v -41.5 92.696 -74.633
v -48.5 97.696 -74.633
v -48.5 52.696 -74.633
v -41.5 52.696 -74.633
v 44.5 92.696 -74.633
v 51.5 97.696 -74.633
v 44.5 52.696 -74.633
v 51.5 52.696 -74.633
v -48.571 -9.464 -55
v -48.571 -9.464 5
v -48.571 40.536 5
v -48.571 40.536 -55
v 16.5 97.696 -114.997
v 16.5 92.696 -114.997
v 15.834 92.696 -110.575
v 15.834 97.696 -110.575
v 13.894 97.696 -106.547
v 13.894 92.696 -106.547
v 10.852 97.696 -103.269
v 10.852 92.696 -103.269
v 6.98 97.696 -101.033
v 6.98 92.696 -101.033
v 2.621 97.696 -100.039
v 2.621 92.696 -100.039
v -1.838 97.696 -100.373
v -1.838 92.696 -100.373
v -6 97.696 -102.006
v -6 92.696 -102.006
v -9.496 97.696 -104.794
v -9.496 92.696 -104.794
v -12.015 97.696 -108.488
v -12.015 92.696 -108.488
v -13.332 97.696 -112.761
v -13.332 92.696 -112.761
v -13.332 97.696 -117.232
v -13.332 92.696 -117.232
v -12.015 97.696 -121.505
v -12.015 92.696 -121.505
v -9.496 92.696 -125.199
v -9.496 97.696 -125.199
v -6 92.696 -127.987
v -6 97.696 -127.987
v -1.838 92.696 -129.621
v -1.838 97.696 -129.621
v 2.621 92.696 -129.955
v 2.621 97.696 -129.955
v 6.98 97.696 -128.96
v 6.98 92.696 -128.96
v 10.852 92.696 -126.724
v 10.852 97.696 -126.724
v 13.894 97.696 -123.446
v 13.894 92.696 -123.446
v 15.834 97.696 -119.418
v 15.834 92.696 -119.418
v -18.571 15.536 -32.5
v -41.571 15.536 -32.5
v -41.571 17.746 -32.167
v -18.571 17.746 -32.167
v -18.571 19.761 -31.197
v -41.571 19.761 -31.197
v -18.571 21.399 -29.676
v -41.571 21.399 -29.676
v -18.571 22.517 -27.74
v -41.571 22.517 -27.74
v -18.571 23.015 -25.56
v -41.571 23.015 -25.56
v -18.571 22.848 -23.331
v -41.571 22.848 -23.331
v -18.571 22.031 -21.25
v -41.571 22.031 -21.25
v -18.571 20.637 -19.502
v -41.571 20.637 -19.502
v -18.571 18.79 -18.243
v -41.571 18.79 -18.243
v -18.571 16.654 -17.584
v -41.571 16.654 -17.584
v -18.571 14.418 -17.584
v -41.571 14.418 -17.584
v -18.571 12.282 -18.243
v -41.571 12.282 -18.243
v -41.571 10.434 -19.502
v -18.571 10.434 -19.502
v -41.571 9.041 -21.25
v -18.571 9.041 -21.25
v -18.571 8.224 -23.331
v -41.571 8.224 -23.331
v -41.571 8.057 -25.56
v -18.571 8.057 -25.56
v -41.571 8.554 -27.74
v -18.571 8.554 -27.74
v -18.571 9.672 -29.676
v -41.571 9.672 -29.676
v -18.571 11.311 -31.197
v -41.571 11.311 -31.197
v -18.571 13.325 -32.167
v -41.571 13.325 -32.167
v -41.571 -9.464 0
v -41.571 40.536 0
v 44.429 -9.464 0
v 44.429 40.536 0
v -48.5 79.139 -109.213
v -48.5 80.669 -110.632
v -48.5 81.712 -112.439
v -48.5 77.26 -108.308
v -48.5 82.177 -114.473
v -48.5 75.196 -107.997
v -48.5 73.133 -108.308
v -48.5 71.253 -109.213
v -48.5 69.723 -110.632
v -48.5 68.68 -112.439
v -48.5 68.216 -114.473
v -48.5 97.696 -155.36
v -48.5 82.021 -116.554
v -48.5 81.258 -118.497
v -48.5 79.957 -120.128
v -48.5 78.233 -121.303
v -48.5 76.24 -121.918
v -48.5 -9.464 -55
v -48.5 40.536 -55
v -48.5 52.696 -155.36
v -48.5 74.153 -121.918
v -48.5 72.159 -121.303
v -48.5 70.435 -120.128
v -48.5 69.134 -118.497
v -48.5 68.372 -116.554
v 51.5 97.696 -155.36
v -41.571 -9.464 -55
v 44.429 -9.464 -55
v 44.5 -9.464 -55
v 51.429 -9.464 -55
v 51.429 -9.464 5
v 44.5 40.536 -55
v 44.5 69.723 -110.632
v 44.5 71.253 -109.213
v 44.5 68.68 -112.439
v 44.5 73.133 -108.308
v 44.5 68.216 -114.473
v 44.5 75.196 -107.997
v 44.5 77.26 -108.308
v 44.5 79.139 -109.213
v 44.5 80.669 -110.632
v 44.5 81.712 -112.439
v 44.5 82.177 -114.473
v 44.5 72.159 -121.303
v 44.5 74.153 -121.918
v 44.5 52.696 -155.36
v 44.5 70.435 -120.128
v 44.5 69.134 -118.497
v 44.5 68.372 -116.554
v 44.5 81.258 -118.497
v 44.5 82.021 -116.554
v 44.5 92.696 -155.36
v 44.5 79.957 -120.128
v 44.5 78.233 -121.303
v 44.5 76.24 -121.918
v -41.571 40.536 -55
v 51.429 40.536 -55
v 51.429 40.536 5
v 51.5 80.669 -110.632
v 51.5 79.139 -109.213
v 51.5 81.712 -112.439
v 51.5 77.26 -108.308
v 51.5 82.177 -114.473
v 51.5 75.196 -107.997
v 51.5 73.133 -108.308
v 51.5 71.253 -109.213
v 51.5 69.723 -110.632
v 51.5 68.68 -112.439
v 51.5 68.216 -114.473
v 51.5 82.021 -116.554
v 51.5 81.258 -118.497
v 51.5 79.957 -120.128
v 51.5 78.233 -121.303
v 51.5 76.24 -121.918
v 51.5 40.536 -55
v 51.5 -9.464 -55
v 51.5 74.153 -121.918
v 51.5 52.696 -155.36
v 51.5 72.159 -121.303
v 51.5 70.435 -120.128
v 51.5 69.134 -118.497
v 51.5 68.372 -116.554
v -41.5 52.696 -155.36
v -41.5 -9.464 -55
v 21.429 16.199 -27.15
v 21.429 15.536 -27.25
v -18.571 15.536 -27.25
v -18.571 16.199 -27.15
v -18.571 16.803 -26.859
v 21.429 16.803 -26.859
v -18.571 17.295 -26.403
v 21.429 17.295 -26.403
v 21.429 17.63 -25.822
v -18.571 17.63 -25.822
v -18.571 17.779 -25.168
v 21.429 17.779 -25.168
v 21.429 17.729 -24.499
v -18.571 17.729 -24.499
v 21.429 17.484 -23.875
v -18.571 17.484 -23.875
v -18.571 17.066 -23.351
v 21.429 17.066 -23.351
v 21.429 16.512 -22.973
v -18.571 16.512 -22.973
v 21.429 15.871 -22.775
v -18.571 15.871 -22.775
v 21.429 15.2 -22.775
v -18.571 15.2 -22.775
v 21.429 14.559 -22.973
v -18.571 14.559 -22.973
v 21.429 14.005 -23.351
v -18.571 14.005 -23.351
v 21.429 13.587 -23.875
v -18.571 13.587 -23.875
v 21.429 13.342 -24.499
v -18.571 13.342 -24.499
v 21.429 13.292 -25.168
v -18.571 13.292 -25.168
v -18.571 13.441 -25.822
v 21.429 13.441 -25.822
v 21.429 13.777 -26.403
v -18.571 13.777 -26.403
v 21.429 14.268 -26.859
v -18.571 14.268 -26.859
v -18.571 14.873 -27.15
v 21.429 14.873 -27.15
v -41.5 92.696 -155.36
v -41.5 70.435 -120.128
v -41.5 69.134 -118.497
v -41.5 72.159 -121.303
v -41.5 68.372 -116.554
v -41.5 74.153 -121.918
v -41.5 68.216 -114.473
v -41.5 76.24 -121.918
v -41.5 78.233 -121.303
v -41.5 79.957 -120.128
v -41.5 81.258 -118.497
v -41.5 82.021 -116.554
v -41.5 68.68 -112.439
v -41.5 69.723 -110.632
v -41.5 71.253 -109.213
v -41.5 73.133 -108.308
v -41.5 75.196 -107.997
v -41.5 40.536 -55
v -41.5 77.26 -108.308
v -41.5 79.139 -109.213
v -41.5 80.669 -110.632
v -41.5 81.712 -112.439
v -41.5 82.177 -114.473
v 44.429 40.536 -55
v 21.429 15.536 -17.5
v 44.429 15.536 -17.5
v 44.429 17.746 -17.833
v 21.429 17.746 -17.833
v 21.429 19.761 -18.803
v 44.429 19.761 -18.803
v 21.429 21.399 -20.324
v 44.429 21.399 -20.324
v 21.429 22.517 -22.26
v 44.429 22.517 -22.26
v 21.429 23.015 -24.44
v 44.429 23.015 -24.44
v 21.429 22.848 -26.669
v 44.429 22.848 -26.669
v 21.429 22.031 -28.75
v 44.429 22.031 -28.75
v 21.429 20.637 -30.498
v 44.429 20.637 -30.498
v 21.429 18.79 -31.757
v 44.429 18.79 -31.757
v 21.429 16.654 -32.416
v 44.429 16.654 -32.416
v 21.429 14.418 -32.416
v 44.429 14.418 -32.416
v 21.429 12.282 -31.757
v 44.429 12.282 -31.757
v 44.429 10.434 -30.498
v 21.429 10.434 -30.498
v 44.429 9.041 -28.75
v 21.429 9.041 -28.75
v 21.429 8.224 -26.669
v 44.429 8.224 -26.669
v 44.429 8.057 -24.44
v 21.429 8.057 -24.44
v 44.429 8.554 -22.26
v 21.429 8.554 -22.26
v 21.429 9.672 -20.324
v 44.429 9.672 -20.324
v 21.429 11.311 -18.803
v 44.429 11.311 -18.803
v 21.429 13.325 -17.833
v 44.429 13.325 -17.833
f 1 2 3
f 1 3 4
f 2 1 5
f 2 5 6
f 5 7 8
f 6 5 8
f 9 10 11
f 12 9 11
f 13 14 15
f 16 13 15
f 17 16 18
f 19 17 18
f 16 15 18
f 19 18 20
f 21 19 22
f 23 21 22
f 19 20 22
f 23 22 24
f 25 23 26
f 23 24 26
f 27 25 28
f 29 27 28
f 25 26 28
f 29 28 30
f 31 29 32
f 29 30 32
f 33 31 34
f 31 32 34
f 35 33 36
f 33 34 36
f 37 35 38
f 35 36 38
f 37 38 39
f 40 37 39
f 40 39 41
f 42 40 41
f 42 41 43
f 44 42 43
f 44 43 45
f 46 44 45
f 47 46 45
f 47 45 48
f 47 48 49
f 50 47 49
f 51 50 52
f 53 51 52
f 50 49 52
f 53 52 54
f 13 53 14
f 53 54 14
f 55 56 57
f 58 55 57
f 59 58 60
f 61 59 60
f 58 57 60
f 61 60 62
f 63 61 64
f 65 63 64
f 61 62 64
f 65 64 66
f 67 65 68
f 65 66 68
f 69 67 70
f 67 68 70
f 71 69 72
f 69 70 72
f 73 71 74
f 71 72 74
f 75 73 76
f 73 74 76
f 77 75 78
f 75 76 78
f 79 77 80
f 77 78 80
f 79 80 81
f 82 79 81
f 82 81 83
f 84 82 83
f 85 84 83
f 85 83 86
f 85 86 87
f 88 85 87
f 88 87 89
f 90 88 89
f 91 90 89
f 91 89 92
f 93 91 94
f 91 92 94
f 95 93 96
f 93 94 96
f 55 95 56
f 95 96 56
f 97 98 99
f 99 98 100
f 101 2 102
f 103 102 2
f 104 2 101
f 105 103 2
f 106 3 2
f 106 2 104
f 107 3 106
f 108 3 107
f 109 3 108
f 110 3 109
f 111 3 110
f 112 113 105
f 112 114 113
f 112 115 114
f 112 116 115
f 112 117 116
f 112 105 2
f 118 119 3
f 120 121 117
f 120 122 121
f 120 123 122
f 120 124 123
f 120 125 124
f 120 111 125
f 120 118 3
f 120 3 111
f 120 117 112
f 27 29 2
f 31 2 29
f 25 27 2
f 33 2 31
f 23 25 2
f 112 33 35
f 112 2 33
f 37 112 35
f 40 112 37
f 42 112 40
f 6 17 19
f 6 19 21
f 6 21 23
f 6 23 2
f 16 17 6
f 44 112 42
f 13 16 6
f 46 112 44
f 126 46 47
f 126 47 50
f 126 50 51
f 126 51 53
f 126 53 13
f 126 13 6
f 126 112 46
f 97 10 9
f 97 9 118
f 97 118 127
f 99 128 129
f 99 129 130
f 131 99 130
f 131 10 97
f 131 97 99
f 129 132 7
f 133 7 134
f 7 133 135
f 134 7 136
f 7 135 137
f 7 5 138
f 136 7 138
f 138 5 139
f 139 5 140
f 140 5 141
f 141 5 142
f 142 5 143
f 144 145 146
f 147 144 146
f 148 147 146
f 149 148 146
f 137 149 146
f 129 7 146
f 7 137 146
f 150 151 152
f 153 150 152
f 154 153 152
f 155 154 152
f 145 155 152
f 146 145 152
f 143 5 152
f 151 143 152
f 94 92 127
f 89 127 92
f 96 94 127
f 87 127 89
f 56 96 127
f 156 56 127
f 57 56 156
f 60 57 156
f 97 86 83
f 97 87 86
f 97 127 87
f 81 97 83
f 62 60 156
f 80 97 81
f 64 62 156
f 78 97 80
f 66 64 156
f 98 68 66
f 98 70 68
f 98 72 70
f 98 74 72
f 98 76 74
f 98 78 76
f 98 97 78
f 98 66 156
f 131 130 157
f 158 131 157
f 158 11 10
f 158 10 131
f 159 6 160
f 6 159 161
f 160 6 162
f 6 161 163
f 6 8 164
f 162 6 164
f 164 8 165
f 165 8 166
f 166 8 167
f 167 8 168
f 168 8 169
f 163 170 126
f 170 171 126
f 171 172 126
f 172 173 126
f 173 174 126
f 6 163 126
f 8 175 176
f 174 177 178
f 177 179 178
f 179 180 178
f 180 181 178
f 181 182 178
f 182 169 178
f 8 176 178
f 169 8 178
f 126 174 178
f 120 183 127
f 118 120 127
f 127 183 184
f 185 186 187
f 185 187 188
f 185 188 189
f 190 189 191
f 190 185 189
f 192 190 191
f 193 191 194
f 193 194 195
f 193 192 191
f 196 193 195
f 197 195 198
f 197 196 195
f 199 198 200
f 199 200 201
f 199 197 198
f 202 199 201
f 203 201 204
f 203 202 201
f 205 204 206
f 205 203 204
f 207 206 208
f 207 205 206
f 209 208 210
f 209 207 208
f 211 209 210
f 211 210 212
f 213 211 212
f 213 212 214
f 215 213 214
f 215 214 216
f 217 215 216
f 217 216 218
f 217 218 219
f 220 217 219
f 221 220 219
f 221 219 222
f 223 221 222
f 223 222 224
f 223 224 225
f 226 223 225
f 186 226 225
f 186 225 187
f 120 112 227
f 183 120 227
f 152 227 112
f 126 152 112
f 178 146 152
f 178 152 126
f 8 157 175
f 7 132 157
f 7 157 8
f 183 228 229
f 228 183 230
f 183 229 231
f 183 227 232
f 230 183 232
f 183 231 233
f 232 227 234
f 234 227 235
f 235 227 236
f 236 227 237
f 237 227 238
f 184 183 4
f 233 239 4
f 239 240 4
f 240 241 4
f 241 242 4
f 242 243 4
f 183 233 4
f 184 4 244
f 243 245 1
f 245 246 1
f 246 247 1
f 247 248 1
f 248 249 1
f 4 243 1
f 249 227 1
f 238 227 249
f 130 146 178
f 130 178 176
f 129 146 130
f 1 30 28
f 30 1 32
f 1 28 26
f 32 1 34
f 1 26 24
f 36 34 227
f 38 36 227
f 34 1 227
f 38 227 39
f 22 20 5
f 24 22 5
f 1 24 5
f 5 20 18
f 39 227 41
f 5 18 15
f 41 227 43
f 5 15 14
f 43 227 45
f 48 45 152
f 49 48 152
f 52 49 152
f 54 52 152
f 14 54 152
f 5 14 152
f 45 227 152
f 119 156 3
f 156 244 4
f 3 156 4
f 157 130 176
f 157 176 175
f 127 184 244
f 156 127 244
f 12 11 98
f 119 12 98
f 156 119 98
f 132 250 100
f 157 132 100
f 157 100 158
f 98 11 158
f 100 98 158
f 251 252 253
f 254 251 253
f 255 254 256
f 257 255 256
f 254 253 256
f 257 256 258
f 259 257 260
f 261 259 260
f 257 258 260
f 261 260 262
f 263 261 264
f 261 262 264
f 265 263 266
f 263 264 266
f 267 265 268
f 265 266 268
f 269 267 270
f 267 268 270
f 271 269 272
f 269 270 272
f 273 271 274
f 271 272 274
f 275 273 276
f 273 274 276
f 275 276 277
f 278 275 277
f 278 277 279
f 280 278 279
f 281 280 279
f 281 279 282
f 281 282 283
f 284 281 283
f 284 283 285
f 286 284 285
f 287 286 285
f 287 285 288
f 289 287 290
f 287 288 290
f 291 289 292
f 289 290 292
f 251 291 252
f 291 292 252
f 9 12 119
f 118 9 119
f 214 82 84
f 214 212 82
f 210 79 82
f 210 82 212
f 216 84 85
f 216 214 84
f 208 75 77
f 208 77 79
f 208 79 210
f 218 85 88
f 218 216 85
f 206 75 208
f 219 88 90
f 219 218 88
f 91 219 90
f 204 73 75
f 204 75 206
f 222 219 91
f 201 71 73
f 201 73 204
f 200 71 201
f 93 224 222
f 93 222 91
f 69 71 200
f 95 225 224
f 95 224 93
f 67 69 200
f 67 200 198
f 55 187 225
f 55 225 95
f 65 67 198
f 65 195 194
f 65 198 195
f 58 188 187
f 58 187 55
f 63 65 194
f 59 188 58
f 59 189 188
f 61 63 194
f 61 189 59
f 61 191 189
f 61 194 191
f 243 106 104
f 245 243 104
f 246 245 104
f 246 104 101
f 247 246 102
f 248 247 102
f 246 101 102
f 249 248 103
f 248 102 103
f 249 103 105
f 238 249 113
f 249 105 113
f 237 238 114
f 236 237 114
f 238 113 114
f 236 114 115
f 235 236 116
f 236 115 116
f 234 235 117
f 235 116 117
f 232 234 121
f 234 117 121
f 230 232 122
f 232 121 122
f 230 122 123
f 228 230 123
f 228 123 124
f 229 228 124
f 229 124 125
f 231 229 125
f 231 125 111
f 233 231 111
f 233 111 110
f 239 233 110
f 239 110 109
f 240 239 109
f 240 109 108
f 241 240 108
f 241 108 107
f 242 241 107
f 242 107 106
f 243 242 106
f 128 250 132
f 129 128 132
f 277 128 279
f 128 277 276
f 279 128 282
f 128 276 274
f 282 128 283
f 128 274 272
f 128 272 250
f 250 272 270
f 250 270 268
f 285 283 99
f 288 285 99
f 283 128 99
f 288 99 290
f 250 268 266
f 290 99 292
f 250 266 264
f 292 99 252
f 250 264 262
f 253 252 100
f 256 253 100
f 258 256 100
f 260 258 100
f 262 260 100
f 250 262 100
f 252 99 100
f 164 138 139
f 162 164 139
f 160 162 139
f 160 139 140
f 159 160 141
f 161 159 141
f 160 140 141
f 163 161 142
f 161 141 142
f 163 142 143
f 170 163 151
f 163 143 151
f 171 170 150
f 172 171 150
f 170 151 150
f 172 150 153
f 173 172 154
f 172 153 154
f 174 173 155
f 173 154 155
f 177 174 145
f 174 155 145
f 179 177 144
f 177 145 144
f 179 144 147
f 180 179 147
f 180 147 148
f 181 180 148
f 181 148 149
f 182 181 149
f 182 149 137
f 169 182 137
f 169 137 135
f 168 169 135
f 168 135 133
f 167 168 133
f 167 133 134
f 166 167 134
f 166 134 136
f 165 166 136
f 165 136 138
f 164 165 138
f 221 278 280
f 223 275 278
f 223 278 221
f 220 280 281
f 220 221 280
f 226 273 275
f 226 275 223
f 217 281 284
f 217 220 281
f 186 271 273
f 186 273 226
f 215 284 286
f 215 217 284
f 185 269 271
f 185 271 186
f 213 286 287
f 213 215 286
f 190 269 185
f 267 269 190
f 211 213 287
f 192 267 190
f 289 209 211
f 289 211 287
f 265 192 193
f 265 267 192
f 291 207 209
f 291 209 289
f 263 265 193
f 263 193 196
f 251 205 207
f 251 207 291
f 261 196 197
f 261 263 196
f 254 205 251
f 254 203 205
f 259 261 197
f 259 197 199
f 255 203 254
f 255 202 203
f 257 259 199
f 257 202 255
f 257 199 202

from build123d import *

# Parameters (mm, degrees)
SKETCH1_W            = 100
SKETCH1_H            = 50
BOSS_EXTRUDE1_DEPTH  = 5
SKETCH2_W            = 7
SKETCH2_H            = 50
BOSS_EXTRUDE2_DEPTH  = 55
BOSS_EXTRUDE3_DEPTH  = 7
BOSS_EXTRUDE8_DEPTH  = 7
SKETCH14_W           = 80.726202609
SKETCH14_H           = 40
BOSS_EXTRUDE11_DEPTH = 7
SKETCH15_W           = 80.726202609
SKETCH15_H           = 40
BOSS_EXTRUDE12_DEPTH = 7
SKETCH24_W           = 100
SKETCH24_H           = 80.726202609
BOSS_EXTRUDE21_DEPTH = 5
SKETCH25_R           = 7
CUT_EXTRUDE5_DEPTH   = 101
SKETCH26_R           = 15
CUT_EXTRUDE6_DEPTH   = 5
BOSS_EXTRUDE22_REACH = 102
SKETCH30_R           = 2.25
SKETCH32_R           = 7.5
BOSS_EXTRUDE23_DEPTH = 23
SKETCH33_R           = 7.5
BOSS_EXTRUDE24_DEPTH = 23


with BuildPart() as part:
    # Sketch1 → Boss-Extrude1 (new body)
    with BuildSketch(Plane.XY):
        with Locations((1.428571429, 15.535714286)):
            Rectangle(SKETCH1_W, SKETCH1_H)
    extrude(amount=BOSS_EXTRUDE1_DEPTH)

    # Sketch2 → Boss-Extrude2 (add)
    with BuildSketch(Plane.XY):
        with Locations((47.928571429, 15.535714286)):
            Rectangle(SKETCH2_W, SKETCH2_H)
        with Locations((-45.071428571, 15.535714286)):
            Rectangle(SKETCH2_W, SKETCH2_H)
    extrude(amount=-BOSS_EXTRUDE2_DEPTH)

    # Sketch3 → Boss-Extrude3 (add)
    with BuildSketch(Plane(origin=(44.5, 0, 0), x_dir=(0, 0, -1), z_dir=(1, 0, 0))):
        Polygon((55, 40.535714286), (74.633488262, 52.696256729), (155.359690871, 52.696256729), (55, -9.464285714), align=None)
    extrude(amount=BOSS_EXTRUDE3_DEPTH)

    # Sketch11 → Boss-Extrude8 (add)
    with BuildSketch(Plane.ZY.offset(41.5)):
        Polygon((-55, -9.464285714), (-55, 40.535714286), (-74.633488262, 52.696256729), (-155.359690871, 52.696256729), align=None)
    extrude(amount=BOSS_EXTRUDE8_DEPTH)

    # Sketch14 → Boss-Extrude11 (add)
    with BuildSketch(Plane.ZY.offset(41.5)):
        with Locations((-114.996589567, 72.696256729)):
            Rectangle(SKETCH14_W, SKETCH14_H)
    extrude(amount=BOSS_EXTRUDE11_DEPTH)

    # Sketch15 → Boss-Extrude12 (add)
    with BuildSketch(Plane(origin=(44.5, 0, 0), x_dir=(0, 0, -1), z_dir=(1, 0, 0))):
        with Locations((114.996589567, 72.696256729)):
            Rectangle(SKETCH15_W, SKETCH15_H)
    extrude(amount=BOSS_EXTRUDE12_DEPTH)

    # Sketch24 → Boss-Extrude21 (add)
    with BuildSketch(Plane(origin=(0, 92.696256729, 0), x_dir=(1, 0, 0), z_dir=(0, 1, 0))):
        with Locations((1.5, 114.996589567)):
            Rectangle(SKETCH24_W, SKETCH24_H)
    extrude(amount=BOSS_EXTRUDE21_DEPTH)

    # Sketch25 → Cut-Extrude5 (cut, through all)
    with BuildSketch(Plane.ZY.offset(48.5)):
        with Locations((-114.996589567, 75.196256729)):
            Circle(SKETCH25_R)
    extrude(amount=-CUT_EXTRUDE5_DEPTH, mode=Mode.SUBTRACT)

    # Sketch26 → Cut-Extrude6 (cut)
    with BuildSketch(Plane.XZ.offset(-92.696256729)):
        with Locations((1.5, -114.996589567)):
            Circle(SKETCH26_R)
    extrude(amount=-CUT_EXTRUDE6_DEPTH, mode=Mode.SUBTRACT)

    # Sketch30 → Boss-Extrude22 (add, up to next)
    with BuildSketch(Plane(origin=(51.428571429, 0, 0), x_dir=(0, 0, -1), z_dir=(1, 0, 0)), mode=Mode.PRIVATE) as boss_extrude22_sk1:
        with Locations((25, 15.535714286)):
            Circle(SKETCH30_R)
    boss_extrude22_tool1 = extrude(boss_extrude22_sk1.sketch, amount=-BOSS_EXTRUDE22_REACH, mode=Mode.PRIVATE) - part.part
    add(boss_extrude22_tool1.solids().sort_by_distance((51.428571, 15.535714, -25))[0])

    # Sketch32 → Boss-Extrude23 (add)
    with BuildSketch(Plane.ZY.offset(-44.428571429)):
        with Locations((-25, 15.535714286)):
            Circle(SKETCH32_R)
    extrude(amount=BOSS_EXTRUDE23_DEPTH)

    # Sketch33 → Boss-Extrude24 (add)
    with BuildSketch(Plane(origin=(-41.571428571, 0, 0), x_dir=(0, 0, -1), z_dir=(1, 0, 0))):
        with Locations((25, 15.535714286)):
            Circle(SKETCH33_R)
    extrude(amount=BOSS_EXTRUDE24_DEPTH)


solid = part.part
